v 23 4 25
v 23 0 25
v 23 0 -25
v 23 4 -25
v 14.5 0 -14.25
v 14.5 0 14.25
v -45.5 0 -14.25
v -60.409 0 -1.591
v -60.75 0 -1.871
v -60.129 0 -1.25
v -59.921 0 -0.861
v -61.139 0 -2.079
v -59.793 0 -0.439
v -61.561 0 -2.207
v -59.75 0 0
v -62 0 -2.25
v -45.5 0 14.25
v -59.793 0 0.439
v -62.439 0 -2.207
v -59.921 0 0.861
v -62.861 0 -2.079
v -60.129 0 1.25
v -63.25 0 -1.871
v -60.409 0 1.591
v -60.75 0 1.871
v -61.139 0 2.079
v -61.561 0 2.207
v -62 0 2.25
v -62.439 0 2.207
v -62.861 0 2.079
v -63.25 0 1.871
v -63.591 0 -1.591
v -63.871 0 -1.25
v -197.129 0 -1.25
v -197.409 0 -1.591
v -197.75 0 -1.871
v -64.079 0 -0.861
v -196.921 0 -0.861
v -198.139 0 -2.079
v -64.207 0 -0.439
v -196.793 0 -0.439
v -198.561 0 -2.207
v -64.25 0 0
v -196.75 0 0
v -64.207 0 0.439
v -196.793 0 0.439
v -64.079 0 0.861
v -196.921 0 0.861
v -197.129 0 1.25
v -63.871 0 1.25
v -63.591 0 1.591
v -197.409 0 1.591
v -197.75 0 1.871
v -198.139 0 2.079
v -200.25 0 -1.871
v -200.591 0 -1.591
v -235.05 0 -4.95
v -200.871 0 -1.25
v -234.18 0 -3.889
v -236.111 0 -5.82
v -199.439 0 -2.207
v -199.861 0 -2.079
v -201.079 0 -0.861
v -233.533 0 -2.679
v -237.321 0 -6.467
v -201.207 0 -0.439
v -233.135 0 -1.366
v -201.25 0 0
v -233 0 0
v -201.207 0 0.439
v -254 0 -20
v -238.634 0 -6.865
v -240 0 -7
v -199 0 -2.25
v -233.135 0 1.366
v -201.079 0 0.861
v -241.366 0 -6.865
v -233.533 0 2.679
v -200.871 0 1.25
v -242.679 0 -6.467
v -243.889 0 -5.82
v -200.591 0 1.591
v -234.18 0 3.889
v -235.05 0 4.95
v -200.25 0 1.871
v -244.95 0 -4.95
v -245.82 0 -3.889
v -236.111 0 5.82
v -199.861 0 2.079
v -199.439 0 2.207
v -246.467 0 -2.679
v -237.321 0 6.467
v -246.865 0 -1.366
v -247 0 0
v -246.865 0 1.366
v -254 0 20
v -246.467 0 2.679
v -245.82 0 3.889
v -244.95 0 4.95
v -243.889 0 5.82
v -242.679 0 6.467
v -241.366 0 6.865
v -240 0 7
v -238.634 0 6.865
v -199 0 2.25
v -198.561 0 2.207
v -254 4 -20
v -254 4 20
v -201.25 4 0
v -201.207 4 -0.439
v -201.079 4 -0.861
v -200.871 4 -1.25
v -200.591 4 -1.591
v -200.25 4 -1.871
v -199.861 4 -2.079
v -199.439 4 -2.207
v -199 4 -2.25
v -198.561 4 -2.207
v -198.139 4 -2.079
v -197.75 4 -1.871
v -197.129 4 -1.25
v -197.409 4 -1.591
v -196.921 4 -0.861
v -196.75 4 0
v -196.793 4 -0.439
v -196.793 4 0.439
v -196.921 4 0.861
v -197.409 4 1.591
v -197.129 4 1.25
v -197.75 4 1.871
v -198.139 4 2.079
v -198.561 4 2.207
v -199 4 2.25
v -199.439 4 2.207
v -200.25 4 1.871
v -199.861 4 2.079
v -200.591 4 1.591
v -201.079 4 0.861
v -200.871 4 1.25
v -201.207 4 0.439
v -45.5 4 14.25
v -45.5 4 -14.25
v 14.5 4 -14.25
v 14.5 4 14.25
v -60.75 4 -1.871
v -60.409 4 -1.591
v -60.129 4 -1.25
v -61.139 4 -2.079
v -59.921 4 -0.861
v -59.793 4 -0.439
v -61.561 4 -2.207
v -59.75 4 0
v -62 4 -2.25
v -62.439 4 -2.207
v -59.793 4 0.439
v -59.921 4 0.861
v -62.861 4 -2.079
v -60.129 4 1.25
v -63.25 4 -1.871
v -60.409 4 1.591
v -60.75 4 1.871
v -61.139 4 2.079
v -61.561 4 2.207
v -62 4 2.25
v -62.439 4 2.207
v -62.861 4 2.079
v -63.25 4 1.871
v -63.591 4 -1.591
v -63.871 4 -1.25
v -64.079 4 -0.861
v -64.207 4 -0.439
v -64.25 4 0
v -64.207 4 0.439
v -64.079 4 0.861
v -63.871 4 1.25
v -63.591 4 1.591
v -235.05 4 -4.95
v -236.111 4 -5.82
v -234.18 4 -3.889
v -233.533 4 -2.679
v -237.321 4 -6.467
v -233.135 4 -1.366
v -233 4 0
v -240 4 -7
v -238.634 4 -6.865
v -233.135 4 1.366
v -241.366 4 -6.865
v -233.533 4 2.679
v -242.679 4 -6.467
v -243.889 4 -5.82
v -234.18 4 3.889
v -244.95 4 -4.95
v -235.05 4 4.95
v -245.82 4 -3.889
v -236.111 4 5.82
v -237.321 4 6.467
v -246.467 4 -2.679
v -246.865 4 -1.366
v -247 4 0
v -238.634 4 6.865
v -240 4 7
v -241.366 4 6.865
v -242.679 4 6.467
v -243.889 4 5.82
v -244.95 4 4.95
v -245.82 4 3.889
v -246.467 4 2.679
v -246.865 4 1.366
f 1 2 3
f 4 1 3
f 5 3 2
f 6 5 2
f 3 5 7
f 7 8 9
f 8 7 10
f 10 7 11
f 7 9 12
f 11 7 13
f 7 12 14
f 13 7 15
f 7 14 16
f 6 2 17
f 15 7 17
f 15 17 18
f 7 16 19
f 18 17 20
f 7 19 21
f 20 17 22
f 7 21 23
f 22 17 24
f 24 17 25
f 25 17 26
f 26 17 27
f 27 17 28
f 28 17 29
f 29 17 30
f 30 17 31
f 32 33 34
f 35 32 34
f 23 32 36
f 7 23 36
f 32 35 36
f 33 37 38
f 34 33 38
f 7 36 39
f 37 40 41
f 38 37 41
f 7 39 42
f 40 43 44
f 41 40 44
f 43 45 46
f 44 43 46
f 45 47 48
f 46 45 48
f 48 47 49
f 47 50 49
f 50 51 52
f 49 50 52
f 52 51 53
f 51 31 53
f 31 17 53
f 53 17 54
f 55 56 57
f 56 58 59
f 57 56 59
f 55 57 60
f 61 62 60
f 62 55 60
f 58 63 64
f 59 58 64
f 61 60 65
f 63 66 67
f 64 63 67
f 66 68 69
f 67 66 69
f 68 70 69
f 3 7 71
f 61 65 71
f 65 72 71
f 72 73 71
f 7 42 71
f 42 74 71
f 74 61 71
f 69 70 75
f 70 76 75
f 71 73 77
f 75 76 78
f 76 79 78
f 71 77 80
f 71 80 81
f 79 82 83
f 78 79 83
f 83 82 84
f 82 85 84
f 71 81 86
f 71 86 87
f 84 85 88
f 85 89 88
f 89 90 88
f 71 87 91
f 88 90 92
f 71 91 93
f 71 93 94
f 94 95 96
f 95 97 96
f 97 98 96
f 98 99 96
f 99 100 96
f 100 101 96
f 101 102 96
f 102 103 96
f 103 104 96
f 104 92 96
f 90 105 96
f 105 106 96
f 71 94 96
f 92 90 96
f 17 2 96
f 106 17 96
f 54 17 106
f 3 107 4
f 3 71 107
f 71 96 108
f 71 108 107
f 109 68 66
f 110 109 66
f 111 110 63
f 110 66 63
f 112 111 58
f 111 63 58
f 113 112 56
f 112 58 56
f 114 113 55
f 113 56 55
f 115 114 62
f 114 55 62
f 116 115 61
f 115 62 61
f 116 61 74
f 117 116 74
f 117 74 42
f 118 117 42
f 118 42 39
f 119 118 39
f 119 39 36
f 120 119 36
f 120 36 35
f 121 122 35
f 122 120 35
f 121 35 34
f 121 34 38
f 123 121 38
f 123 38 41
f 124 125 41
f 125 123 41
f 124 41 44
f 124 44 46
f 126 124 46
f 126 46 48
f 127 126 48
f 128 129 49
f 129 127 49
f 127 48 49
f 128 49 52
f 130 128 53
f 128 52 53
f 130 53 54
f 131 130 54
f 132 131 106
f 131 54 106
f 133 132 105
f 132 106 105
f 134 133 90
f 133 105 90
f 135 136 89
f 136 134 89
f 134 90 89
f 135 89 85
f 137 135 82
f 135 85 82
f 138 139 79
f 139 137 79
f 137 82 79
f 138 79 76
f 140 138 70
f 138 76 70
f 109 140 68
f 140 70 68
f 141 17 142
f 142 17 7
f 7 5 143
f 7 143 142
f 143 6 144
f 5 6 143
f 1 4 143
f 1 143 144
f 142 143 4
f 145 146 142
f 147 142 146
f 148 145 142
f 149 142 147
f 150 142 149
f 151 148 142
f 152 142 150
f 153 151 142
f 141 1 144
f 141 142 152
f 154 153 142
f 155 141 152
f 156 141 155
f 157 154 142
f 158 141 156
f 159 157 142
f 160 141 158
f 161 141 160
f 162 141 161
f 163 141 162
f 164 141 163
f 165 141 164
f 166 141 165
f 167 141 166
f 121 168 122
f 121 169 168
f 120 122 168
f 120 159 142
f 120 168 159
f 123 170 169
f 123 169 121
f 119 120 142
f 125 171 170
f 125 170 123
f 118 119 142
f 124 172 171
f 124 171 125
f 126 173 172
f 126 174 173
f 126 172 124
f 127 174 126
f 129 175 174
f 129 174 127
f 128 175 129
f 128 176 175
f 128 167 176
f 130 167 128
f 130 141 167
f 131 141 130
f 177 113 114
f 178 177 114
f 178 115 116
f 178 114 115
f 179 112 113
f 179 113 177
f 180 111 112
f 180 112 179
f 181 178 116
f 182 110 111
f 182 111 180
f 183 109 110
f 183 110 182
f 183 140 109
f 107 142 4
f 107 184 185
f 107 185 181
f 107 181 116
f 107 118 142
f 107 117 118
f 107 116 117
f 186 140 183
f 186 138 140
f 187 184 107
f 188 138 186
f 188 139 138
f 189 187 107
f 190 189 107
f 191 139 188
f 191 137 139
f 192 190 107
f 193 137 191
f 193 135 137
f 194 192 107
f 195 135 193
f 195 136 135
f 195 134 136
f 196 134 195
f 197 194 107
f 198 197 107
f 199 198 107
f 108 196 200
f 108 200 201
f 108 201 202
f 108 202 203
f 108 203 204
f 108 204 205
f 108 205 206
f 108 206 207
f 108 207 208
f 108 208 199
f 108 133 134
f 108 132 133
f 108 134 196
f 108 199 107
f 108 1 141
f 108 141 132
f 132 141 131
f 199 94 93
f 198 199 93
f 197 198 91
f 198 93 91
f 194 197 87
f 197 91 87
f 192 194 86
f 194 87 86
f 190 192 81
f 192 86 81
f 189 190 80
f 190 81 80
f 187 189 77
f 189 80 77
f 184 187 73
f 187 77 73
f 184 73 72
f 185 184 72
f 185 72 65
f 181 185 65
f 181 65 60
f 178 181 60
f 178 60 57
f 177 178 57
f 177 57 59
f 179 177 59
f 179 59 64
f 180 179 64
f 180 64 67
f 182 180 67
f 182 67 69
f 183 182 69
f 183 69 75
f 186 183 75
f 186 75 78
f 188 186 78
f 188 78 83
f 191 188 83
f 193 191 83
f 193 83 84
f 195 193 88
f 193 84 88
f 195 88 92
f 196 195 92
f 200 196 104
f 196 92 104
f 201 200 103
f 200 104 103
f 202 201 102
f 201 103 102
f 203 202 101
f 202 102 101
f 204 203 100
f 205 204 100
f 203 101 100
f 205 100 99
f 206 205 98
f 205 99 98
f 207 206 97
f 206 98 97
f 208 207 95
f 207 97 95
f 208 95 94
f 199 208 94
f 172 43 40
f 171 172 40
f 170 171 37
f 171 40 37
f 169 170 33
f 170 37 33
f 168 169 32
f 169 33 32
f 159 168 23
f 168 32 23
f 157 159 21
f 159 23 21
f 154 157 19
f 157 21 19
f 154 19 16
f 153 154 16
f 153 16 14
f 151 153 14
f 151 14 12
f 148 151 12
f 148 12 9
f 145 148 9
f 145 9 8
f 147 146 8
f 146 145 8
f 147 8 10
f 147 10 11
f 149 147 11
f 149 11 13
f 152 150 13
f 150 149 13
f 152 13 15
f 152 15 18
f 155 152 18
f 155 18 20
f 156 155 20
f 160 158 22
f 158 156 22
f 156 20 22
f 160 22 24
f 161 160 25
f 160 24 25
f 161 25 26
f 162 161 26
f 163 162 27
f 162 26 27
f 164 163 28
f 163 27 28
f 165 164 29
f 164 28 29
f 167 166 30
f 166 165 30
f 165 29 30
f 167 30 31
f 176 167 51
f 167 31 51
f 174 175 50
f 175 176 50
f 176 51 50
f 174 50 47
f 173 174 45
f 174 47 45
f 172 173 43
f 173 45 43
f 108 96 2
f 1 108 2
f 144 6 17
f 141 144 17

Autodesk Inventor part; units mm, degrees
ref_plane "YZ Plane" through (0, 0, 0) normal (1, 0, 0) x (0, 1, 0)
ref_plane "XZ Plane" through (0, 0, 0) normal (0, 1, 0) x (-1, 0, 0)
ref_plane "XY Plane" through (0, 0, 0) normal (0, 0, 1) x (1, 0, 0)
sketch "Sketch2" plane through (0, 0, 0) normal (0, 1, 0) x (-1, 0, 0)
  circle A0 centre (188.3525, 14.1838) radius 2 projected
  circle A1 centre (143.3599, 14.996) radius 2 projected
  circle A2 centre (98.3672, 15.8081) radius 2 projected
  circle A3 centre (53.3745, 16.6203) radius 2 projected
  circle A4 centre (62, 0) radius 2.25 projected
  circle A5 centre (199, 0) radius 2.25 projected
  circle A6 centre (214.5, 0) radius 1.5 projected
  line L0 (217, 7) -> (217, -7) projected
  line L1 (217, 7) -> (247, 7) projected
  line L2 (247, 7) -> (247, -7) projected
  line L3 (217, -7) -> (247, -7) projected
  circle A7 centre (249.5, 0) radius 1.5 projected
  line L4 (254, 20) -> (254, -20) projected
  line L5 (254, 20) -> (-23, 25) projected
  line L6 (-23, 25) -> (-23, -25) projected
  line L7 (254, -20) -> (-23, -25) projected
  circle A8 centre (50, -8.5) radius 1.5 projected
  circle A9 centre (-19, -8.5) radius 1.5 projected
  line L8 (45.5, 14.25) -> (45.5, -14.25) projected
  line L9 (-14.5, -14.25) -> (45.5, -14.25) projected
  line L10 (-14.5, 14.25) -> (-14.5, -14.25) projected
  line L11 (-14.5, 14.25) -> (45.5, 14.25) projected
  circle A10 centre (-19, 8.5) radius 1.5 projected
  circle A11 centre (50, 8.5) radius 1.5 projected
  circle A12 centre (240, 0) radius 1.2295 construction
  circle A13 centre (240, 0) radius 7
  point P0 (0, 0)
  dimension "d77" = 14
  dimension "d28" = 18.5
  dimension "d37" = 20
  dimension "d38" = 20
  dimension "d39" = 42
  dimension "d40" = 21
  dimension "d41" = 50
  dimension "d42" = 10
  dimension "d43" = 10.5
  dimension "d52" = 240
  dimension "d53" = 14
  dimension "d54" = 9.5
  dimension "d62" = 10
  dimension "d73" = 274
  dimension "d74" = 20
extrude "Extrusion2" add sketch "Sketch2" along normal blind 4 contours A0 | A1 | A2 | A3 | A6 | L1 A13 L3 L0 | L1 L2 A13 | A13 L2 L3 | A7 | L4 L7 L6 L5 | A8 | A9 | A10 | A11
properties part number "segment2b" material "Plywood, Finish"
